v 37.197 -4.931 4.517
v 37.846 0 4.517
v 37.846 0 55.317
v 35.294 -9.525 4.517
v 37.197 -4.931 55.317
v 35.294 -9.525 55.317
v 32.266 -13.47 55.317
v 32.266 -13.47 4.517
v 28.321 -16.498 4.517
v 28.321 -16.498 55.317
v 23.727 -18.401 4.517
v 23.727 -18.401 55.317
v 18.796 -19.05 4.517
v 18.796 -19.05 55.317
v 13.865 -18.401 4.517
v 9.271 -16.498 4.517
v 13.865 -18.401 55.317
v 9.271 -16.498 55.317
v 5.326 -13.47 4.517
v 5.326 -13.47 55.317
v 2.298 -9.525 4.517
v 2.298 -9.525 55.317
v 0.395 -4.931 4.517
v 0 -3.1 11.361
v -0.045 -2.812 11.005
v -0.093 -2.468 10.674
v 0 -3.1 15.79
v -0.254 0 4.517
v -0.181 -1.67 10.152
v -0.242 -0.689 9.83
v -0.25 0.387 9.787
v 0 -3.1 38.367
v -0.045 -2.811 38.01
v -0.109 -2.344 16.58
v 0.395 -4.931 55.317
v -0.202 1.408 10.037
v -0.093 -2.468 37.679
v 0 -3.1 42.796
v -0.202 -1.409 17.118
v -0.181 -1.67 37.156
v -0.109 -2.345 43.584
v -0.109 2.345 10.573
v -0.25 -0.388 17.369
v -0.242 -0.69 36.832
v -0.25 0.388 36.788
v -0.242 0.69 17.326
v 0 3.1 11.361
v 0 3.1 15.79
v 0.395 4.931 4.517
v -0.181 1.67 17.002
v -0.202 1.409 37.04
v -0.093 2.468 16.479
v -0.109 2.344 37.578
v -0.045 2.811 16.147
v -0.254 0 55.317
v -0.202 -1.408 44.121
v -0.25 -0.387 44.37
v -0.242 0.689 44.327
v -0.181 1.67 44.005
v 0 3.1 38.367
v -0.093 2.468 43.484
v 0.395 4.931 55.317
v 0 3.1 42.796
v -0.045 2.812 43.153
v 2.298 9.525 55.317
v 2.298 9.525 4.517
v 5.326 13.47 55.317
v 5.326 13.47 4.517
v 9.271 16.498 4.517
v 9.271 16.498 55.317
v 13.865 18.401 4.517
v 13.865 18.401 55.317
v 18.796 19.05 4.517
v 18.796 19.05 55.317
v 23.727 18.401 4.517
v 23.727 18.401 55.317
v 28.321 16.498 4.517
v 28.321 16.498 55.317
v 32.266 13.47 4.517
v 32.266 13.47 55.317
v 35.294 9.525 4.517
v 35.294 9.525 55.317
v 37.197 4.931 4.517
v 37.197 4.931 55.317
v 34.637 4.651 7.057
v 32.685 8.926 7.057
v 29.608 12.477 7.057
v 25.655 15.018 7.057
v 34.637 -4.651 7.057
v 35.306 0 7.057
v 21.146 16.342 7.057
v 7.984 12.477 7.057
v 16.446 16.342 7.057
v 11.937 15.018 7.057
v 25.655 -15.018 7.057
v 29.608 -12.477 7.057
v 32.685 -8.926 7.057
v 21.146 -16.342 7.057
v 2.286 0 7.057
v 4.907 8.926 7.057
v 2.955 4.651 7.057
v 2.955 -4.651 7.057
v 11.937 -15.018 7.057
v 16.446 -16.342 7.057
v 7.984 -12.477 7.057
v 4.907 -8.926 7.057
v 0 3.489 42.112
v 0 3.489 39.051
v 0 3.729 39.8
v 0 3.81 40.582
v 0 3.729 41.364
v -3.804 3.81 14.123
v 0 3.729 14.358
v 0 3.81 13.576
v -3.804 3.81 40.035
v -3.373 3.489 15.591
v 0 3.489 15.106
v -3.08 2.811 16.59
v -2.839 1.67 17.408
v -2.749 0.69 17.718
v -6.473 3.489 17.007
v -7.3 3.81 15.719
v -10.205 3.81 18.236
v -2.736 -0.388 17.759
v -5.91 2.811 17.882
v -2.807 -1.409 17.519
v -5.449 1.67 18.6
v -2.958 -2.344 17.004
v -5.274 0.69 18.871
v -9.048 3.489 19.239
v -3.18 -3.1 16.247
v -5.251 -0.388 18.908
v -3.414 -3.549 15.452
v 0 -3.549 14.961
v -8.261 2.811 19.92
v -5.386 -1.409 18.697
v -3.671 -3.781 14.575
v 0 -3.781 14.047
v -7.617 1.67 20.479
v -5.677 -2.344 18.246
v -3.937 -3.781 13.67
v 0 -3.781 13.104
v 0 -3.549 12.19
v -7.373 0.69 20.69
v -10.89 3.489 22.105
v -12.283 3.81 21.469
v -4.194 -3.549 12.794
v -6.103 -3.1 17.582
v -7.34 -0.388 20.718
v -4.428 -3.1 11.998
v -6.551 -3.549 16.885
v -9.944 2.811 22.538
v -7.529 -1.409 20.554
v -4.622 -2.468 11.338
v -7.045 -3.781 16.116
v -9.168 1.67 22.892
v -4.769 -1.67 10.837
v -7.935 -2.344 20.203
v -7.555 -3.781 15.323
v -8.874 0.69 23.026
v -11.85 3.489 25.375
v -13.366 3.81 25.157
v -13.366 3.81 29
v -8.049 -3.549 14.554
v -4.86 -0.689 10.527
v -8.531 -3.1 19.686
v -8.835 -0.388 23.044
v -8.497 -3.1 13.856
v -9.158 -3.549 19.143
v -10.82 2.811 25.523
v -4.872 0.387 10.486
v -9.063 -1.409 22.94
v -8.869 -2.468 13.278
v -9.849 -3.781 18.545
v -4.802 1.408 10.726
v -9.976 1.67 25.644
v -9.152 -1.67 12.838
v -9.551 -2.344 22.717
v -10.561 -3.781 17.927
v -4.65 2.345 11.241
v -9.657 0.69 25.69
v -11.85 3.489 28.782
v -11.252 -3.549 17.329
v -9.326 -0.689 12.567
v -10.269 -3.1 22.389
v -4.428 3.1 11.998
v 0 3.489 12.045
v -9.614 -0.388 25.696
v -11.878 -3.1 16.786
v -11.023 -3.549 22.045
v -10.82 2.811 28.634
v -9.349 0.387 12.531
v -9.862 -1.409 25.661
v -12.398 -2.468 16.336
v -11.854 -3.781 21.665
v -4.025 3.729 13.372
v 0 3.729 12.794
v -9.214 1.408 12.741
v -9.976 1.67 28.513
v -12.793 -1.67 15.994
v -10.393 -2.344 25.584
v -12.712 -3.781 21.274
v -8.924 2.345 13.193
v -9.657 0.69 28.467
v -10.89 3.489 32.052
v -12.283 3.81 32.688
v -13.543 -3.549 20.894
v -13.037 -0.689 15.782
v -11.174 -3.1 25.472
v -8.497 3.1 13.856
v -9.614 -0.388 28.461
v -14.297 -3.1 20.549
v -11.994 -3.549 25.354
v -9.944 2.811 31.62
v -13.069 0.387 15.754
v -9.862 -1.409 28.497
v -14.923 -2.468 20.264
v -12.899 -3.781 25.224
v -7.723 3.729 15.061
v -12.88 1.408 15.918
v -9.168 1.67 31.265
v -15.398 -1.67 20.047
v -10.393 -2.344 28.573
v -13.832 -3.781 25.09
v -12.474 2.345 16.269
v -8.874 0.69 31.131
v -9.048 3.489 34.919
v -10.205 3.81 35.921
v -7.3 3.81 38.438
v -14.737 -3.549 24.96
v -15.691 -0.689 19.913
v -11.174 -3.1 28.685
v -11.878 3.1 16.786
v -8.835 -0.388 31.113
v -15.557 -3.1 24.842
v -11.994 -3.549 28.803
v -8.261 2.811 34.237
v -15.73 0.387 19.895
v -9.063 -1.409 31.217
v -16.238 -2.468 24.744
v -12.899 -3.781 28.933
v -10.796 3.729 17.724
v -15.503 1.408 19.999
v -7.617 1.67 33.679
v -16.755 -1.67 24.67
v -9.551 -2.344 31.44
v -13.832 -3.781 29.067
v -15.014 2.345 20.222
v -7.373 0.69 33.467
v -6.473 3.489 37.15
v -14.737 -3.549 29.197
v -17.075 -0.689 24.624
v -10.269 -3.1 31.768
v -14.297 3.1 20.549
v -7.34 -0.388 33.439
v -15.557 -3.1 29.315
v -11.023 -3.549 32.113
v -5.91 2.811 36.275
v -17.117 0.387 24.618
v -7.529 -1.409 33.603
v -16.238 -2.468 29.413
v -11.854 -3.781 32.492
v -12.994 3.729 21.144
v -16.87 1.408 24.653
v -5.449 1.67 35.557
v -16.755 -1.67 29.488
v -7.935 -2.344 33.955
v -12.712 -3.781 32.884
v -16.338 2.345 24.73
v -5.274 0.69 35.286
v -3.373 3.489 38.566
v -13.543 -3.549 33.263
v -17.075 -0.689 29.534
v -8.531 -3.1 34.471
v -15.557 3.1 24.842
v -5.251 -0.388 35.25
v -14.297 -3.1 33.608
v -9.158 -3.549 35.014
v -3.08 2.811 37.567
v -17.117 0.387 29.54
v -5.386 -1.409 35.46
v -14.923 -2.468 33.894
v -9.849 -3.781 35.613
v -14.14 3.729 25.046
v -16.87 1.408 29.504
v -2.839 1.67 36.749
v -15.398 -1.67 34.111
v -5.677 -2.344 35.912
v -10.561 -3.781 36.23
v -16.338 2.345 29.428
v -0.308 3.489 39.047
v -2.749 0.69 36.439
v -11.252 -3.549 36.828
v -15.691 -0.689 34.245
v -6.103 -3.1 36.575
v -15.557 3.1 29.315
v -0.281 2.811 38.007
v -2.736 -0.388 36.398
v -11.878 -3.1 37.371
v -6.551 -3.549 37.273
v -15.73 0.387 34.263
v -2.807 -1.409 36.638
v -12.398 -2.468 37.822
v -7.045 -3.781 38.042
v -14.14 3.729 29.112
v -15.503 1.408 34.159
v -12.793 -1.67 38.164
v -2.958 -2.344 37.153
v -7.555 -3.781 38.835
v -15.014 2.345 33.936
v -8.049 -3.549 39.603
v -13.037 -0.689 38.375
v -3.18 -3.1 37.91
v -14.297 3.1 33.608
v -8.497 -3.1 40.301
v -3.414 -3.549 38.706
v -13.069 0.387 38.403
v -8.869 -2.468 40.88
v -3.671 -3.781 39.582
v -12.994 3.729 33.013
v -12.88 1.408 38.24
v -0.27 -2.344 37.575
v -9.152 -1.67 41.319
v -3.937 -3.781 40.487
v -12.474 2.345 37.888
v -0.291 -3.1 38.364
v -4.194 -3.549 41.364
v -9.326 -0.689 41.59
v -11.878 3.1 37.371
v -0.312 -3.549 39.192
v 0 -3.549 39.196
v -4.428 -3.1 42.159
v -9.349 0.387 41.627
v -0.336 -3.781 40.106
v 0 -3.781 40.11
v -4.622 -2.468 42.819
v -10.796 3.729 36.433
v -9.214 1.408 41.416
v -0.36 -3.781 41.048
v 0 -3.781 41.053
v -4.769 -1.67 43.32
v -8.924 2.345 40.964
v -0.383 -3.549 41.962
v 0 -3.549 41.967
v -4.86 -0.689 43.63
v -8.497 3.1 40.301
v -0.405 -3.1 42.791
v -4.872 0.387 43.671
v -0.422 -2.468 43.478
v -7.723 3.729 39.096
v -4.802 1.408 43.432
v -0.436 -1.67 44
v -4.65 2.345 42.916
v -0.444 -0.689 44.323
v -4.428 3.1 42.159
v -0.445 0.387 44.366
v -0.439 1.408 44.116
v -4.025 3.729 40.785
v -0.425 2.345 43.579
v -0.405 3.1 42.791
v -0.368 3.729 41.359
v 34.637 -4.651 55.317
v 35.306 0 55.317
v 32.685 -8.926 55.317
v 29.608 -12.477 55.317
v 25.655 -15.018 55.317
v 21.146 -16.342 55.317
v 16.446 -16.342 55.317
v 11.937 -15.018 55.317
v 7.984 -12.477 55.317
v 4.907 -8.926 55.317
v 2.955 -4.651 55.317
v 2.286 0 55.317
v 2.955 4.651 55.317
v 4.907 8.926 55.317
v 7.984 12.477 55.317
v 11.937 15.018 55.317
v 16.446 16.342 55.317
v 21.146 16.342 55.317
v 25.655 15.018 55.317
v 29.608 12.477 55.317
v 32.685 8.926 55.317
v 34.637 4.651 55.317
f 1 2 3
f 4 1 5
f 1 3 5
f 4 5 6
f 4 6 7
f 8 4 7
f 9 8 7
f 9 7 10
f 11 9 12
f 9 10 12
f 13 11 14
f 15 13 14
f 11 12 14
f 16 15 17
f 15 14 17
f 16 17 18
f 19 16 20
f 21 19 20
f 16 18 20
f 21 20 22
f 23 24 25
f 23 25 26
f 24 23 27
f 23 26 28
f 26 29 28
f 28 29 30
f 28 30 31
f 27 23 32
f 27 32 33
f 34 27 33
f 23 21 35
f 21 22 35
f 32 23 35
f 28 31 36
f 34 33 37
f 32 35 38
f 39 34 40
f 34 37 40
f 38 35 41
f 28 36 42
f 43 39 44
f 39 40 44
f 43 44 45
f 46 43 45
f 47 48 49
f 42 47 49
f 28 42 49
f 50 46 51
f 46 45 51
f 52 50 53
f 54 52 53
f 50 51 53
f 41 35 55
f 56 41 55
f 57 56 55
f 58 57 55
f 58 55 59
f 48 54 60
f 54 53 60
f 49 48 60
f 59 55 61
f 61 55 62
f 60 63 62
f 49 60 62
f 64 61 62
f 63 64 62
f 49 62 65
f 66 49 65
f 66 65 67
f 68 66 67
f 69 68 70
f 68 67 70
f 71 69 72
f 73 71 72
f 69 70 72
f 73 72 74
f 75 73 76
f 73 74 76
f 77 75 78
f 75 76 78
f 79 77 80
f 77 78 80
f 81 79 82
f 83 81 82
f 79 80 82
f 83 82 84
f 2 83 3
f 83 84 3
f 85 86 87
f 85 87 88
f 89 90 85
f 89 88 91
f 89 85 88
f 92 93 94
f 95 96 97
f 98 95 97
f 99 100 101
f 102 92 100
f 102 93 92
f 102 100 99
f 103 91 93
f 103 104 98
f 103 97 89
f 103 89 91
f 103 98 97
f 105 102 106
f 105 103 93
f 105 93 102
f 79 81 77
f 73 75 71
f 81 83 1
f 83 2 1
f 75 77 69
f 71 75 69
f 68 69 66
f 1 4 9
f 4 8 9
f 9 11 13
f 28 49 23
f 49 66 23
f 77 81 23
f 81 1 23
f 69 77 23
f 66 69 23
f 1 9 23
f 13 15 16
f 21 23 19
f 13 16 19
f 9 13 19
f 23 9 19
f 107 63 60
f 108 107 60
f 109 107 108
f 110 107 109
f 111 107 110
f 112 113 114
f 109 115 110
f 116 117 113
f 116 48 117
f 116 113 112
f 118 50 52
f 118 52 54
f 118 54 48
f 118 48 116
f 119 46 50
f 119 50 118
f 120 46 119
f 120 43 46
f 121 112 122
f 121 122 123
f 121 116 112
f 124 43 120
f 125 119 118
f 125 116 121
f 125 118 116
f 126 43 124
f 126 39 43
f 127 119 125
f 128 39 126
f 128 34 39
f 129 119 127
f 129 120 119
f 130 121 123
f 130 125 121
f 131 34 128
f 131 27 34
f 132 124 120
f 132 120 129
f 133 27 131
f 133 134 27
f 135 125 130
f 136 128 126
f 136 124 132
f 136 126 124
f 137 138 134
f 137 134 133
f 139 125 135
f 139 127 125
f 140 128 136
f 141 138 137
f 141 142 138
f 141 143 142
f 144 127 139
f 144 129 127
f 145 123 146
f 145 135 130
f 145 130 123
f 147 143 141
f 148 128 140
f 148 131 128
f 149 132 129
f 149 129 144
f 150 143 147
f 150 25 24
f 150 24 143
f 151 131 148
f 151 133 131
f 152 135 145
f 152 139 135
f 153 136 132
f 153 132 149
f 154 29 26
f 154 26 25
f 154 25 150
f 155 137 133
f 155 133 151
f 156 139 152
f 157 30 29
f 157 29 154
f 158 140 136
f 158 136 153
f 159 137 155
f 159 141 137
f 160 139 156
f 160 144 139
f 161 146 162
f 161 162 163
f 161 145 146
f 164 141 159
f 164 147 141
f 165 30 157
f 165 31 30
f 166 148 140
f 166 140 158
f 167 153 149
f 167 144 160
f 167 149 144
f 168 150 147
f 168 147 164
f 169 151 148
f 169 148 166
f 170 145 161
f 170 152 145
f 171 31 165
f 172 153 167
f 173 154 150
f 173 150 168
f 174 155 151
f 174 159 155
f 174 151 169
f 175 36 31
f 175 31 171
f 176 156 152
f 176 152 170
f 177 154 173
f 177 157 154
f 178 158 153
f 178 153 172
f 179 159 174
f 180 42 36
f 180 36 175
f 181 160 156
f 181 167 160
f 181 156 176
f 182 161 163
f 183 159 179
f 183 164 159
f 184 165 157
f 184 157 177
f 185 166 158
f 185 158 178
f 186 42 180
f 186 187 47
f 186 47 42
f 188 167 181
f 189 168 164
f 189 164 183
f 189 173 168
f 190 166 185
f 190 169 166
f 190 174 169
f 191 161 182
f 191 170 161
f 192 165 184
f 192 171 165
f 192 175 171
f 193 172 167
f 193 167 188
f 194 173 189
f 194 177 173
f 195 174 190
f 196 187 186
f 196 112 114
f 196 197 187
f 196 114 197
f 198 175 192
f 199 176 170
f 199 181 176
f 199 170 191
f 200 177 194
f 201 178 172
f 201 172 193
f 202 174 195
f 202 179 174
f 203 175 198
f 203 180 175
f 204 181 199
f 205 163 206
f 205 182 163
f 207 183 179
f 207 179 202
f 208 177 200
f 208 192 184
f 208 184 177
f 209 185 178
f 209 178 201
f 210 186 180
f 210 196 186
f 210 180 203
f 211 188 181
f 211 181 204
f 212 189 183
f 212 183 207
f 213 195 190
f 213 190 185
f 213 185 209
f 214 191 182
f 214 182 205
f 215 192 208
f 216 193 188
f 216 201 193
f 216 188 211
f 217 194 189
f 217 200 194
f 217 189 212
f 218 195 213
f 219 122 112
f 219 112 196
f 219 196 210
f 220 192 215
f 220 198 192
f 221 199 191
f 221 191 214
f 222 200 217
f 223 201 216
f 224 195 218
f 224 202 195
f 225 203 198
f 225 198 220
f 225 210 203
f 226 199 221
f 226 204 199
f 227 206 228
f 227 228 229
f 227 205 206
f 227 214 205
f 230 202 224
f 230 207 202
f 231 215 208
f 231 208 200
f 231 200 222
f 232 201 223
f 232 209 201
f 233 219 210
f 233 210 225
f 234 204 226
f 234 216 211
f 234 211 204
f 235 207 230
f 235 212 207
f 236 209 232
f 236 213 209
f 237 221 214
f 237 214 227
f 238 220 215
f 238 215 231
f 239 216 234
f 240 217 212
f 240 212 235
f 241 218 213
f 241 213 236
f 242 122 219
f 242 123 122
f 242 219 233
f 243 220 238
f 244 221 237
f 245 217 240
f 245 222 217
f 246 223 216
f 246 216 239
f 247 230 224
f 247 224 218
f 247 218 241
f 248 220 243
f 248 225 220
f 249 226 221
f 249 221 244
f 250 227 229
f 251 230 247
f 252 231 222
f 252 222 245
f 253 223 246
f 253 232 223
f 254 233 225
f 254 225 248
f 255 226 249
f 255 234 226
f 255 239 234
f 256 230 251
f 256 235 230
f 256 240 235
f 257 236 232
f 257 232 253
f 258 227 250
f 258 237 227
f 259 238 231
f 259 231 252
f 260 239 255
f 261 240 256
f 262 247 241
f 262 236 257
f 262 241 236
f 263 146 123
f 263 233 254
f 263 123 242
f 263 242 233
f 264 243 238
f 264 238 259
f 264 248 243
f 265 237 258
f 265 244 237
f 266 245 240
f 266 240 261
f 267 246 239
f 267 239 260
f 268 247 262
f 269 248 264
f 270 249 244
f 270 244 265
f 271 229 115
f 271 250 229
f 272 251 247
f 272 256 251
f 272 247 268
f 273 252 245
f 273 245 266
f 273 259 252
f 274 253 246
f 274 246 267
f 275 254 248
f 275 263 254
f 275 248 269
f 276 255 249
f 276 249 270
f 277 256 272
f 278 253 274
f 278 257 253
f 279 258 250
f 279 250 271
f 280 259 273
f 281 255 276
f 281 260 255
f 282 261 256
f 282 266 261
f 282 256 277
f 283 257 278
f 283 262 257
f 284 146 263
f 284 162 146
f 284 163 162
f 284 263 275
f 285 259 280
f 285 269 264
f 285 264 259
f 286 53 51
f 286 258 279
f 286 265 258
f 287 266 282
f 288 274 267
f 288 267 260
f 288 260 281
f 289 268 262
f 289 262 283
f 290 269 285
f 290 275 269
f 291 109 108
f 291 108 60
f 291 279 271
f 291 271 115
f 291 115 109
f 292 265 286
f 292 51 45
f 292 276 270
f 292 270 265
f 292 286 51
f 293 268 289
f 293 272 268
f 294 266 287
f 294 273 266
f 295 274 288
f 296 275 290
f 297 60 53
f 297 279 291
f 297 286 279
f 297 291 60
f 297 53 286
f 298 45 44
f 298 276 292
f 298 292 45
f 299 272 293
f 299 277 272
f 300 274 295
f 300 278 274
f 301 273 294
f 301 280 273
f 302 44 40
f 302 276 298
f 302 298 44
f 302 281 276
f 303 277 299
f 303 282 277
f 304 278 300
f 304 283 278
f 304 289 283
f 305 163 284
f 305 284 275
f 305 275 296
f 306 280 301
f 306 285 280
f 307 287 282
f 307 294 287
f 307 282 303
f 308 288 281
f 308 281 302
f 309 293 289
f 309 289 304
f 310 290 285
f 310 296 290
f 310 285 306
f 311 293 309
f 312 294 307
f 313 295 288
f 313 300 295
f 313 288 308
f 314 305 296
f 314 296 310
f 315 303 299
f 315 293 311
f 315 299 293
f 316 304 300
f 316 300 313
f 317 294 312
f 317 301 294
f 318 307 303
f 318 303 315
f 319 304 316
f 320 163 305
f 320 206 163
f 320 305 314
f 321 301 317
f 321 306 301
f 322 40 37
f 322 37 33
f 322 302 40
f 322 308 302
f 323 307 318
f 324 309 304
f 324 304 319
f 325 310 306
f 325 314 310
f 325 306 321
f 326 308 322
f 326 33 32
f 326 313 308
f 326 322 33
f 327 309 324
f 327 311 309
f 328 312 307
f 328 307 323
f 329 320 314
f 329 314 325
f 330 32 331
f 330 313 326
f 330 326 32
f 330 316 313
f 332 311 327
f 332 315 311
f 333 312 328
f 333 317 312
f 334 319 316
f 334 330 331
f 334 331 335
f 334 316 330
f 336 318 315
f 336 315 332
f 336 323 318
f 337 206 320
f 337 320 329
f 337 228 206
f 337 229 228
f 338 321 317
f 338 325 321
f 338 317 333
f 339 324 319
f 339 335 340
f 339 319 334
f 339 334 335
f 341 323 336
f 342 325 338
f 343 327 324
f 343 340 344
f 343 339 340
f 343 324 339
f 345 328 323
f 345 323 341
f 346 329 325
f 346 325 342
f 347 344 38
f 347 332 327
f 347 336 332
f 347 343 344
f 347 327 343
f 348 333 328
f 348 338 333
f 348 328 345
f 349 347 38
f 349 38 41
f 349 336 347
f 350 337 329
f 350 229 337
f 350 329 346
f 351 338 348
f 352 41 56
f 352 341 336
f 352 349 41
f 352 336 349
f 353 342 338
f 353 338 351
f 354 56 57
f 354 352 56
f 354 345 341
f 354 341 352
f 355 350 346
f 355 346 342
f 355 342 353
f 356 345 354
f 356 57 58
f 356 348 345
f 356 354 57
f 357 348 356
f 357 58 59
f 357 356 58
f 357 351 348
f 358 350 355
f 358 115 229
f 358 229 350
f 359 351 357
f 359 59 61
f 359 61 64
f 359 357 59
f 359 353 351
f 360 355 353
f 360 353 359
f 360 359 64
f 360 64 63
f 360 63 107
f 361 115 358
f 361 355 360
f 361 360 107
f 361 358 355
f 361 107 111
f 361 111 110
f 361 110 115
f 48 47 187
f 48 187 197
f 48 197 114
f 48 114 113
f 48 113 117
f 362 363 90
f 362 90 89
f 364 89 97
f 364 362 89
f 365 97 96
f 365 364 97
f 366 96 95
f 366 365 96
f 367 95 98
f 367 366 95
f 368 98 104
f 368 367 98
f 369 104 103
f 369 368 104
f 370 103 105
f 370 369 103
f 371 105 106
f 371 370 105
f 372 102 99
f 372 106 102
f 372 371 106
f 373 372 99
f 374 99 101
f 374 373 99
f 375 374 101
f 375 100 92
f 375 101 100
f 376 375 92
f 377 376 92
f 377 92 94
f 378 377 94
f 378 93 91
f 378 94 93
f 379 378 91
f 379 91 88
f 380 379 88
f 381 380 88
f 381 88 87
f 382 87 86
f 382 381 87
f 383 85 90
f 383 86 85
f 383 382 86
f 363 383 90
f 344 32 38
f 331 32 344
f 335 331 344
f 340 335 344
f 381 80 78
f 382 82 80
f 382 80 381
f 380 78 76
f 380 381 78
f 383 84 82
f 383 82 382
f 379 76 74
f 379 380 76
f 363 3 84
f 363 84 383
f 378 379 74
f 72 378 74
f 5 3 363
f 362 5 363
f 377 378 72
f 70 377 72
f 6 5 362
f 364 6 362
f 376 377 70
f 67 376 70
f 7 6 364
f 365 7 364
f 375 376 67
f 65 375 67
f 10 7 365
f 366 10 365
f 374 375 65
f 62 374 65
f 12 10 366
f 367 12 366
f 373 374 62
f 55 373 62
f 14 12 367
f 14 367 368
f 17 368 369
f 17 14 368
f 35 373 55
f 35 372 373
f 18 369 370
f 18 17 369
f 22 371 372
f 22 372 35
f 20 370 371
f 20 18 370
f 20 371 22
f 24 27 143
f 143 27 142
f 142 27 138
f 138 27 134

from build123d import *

# Parameters (mm, degrees)
F0_W     = 19.05
F0_H     = 50.8
F2_T     = -2.54
F3_R     = 3.81
F4_ANGLE = 180


with BuildPart() as f1:
    # F0 (on Front) → F1 (revolve)
    with BuildSketch(Plane.XZ):
        with Locations((28.321, 29.9166932978)):
            Rectangle(F0_W, F0_H)
    revolve(axis=Axis((18.796, 0, 29.9166932978), (0, 0, -1)))

    # F2
    f2_openings = [f1.faces().sort_by_distance(p)[0] for p in [
        (18.796, 0, 55.316693),
    ]]
    offset(amount=F2_T, openings=f2_openings)

    # F3 (on Right) → F4 (revolve)
    with BuildSketch(Plane.YZ):
        with Locations((0, 13.575695168)):
            Circle(F3_R)
    revolve(axis=Axis((0, -0.5171763977, 27.0786721792), (0, 1, 0)), revolution_arc=F4_ANGLE)


solid = f1.part
